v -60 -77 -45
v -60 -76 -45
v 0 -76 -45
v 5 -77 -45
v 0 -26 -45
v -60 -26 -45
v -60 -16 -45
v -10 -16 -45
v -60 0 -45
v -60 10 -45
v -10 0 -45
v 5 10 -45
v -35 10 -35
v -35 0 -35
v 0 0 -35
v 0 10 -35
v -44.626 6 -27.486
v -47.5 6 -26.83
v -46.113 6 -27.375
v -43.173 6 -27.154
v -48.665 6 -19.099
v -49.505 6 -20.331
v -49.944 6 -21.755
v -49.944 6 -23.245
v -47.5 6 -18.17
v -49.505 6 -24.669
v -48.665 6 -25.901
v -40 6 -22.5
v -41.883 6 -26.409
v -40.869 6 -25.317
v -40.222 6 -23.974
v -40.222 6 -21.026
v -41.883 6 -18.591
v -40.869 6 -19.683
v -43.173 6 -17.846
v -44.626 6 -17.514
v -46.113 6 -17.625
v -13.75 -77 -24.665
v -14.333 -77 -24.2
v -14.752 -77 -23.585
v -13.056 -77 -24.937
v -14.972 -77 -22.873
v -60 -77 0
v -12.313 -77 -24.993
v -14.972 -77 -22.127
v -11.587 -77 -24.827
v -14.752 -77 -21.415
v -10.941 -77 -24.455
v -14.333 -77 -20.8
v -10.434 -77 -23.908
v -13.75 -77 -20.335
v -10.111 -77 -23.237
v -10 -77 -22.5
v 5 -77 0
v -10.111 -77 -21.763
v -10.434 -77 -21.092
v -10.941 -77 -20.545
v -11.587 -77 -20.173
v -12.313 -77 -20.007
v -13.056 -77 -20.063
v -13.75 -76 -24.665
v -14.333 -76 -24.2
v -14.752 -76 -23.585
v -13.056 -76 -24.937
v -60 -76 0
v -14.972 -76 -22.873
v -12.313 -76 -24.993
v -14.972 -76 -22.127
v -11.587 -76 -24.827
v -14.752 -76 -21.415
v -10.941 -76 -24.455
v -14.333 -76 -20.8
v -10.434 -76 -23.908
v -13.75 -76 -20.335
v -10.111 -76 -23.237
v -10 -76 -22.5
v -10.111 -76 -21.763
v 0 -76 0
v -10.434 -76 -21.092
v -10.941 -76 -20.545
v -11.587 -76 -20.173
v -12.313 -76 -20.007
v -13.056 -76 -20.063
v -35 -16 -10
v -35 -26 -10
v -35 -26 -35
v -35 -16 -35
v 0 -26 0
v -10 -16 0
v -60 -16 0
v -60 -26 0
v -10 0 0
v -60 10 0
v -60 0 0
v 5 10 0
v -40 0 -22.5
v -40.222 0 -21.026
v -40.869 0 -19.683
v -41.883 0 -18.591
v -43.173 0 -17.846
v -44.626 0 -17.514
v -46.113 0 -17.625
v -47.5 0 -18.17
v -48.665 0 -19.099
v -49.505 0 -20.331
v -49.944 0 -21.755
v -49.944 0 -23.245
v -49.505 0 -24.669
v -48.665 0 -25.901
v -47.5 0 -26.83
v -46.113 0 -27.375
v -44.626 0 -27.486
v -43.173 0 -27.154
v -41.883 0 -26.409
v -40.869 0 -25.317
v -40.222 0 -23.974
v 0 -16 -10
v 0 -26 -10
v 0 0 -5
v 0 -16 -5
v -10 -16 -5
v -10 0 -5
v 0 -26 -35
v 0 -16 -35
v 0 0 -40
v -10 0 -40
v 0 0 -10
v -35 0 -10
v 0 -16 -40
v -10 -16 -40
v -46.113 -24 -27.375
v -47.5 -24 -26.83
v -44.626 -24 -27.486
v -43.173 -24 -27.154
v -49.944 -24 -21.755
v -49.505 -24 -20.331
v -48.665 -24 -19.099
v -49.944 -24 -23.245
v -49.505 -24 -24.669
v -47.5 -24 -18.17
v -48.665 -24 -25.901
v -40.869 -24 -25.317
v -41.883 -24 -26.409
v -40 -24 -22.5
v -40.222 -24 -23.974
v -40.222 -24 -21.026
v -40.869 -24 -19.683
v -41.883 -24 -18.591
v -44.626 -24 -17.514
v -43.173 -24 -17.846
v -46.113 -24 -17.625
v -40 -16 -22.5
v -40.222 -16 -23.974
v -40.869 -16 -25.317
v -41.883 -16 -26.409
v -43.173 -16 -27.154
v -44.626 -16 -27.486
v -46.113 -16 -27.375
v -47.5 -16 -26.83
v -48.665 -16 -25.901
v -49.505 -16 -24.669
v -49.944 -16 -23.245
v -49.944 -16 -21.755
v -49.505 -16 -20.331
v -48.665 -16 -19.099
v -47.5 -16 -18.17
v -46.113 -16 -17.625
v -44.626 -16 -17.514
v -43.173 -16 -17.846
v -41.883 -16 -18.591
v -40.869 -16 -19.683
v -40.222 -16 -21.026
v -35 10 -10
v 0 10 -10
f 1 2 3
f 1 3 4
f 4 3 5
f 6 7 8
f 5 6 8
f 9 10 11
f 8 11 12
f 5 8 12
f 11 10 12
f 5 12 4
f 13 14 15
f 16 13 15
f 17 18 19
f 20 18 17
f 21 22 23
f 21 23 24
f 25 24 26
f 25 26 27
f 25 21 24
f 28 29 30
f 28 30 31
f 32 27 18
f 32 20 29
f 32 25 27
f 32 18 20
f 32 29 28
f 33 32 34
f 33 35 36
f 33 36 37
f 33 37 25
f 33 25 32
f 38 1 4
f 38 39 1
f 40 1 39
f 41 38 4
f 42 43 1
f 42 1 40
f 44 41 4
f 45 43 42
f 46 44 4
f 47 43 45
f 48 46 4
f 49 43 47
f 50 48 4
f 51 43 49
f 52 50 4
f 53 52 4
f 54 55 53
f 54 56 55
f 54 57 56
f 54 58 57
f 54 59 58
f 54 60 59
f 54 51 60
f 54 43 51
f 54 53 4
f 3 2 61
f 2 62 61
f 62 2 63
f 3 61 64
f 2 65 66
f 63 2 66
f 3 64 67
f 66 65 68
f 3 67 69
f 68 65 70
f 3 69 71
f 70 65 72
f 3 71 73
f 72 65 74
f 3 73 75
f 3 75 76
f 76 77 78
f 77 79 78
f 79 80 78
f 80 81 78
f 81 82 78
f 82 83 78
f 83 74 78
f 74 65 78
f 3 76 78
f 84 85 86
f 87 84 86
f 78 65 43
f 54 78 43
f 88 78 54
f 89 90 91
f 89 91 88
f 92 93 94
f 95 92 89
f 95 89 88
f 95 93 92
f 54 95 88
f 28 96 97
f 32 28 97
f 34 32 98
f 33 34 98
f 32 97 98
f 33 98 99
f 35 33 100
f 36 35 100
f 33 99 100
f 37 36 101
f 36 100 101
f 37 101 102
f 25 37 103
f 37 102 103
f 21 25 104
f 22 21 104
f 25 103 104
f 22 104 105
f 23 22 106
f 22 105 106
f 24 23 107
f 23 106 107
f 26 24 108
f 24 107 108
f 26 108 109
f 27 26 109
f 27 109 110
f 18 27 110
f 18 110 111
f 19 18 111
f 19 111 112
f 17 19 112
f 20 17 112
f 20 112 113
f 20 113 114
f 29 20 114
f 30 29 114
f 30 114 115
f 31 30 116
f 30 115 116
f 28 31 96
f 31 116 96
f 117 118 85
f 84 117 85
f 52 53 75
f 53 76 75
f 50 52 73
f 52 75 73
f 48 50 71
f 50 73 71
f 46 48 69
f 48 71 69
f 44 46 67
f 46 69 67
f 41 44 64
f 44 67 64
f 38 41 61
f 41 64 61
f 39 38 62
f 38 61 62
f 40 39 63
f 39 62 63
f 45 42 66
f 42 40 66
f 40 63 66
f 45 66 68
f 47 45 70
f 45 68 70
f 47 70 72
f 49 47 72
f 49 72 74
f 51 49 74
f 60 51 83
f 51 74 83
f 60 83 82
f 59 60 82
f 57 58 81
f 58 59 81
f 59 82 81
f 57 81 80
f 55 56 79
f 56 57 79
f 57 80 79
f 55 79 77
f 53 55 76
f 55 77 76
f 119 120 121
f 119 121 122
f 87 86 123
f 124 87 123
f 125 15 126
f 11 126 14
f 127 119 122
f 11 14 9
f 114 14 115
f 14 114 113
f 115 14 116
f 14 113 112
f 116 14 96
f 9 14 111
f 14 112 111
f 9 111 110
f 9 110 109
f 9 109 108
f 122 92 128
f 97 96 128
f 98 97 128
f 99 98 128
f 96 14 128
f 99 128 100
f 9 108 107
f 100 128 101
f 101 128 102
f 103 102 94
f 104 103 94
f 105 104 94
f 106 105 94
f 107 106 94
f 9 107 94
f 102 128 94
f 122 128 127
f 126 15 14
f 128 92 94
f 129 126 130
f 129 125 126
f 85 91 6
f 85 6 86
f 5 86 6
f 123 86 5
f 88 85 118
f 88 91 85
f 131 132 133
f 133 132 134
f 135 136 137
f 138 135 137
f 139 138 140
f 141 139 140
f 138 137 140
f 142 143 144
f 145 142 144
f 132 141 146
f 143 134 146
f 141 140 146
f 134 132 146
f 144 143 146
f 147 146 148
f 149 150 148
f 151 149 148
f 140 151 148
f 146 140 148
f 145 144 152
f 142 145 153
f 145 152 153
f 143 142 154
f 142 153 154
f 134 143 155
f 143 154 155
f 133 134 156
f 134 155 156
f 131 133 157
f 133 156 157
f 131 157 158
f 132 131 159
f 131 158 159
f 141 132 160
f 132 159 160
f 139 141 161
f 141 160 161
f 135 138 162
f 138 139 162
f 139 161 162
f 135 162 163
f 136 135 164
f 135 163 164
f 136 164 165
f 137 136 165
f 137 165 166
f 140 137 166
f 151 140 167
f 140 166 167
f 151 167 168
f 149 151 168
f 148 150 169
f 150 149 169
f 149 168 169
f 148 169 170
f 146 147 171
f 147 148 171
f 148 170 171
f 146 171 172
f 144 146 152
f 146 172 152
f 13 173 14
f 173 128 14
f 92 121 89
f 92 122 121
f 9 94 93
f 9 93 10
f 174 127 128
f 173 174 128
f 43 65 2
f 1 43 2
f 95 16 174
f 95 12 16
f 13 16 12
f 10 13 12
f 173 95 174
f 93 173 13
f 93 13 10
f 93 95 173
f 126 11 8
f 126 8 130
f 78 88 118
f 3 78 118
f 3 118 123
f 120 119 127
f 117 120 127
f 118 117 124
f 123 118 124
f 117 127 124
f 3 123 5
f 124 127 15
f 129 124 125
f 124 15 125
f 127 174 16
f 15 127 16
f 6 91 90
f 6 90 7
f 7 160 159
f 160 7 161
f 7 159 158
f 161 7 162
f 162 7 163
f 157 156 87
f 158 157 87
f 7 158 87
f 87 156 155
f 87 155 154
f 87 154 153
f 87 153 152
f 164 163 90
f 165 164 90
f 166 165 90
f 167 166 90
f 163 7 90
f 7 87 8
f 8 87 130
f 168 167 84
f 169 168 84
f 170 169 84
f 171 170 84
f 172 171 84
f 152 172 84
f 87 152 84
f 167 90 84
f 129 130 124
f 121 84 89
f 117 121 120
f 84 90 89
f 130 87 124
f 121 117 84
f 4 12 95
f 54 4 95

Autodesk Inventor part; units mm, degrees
ref_plane "YZ Plane" through (0, 0, 0) normal (1, 0, 0) x (0, 1, 0)
ref_plane "XZ Plane" through (0, 0, 0) normal (0, 1, 0) x (-1, 0, 0)
ref_plane "XY Plane" through (0, 0, 0) normal (0, 0, 1) x (1, 0, 0)
sketch "Эскиз1" plane through (0, 0, 0) normal (0, 1, 0) x (-1, 0, 0)
  line L0 (0, 0) -> (60, 0)
  line L1 (60, 0) -> (60, -45)
  line L2 (60, -45) -> (0, -45)
  line L3 (0, -45) -> (0, 0)
  line L4 (0, -22.5) -> (0, 0)
  line L5 (0, 0) -> (0, -10)
  line L6 (0, -10) -> (35, -10)
  line L7 (35, -10) -> (35, -35)
  line L8 (35, -35) -> (0, -35)
  line L9 (35, -22.5) -> (45, -22.5)
  dimension "d0" = 60
  dimension "d1" = 45
  dimension "d3" = 10
  dimension "d4" = 35
  dimension "d5" = 25
  dimension "d6" = 10
extrude "Выдавливание1" add sketch "Эскиз1" along normal blind 10 contours L0 L1 L2 L3 L8 L7 L6
sketch "Эскиз3" plane through (0, 0, -35) normal (1, 0, 0) x (0, 0, -1)
  line L0 (10, 10) -> (-35, 10) projected
  line L1 (10, 10) -> (-35, 10)
  line L2 (-35, 10) -> (-35, -26)
  line L3 (-35, -26) -> (10, -26)
  line L4 (10, -26) -> (10, 10)
  point P0 (-35, 0)
  dimension "d13" = 45
  dimension "d14" = 36
extrude "Выдавливание3" add sketch "Эскиз3" along normal blind 5
sketch "Эскиз4" plane through (0, -26, -45) normal (0, -1, 0) x (1, 0, 0)
  line L0 (-60, 0) -> (0, 0)
  line L1 (0, 0) -> (0, 45)
  line L2 (0, 45) -> (-60, 45)
  line L3 (-60, 45) -> (-60, 0)
  line L4 (0, 35) -> (-35, 35) projected
  line L5 (-35, 10) -> (0, 10)
  line L6 (0, 10) -> (0, 35)
  line L7 (0, 35) -> (-35, 35)
  line L8 (-35, 35) -> (-35, 10)
extrude "Выдавливание4" add sketch "Эскиз4" against normal blind 10 contours L3 L2 L1 L4 L8 L5 L0
sketch "Эскиз5" plane through (0, 0, 0) normal (0, -1, 0) x (1, 0, 0)
  line L0 (-35, -10) -> (-35, -35) projected
  line L1 (-35, -22.5) -> (-45, -22.5)
  circle A0 centre (-45, -22.5) radius 5
  point P0 (0, 0)
  dimension "d19" = 10
  dimension "d20" = 10
extrude "Выдавливание5" cut sketch "Эскиз5" along normal blind 24 and the other way blind 6
sketch "Эскиз6" plane through (5, -26, -45) normal (0, -1, 0) x (1, 0, 0)
  line L0 (0, 0) -> (0, 45) projected
  line L1 (-65, 0) -> (0, 0) projected
  line L2 (0, 45) -> (-5, 45)
  line L3 (-5, 45) -> (-5, 0)
  line L4 (-5, 0) -> (0, 0)
  line L5 (0, 0) -> (0, 45)
extrude "Выдавливание6" add sketch "Эскиз6" along normal blind 50
sketch "Эскиз7" plane through (5, -76, -45) normal (0, -1, 0) x (1, 0, 0)
  line L0 (-65, 45) -> (0, 45) projected
  line L1 (0, 45) -> (-65, 45)
  line L2 (-65, 45) -> (-65, 0)
  line L3 (-65, 0) -> (0, 0)
  line L4 (0, 0) -> (0, 45)
  line L5 (-5, 10) -> (-5, 35) projected
  line L6 (-5, 22.5) -> (-15, 22.5)
  line L7 (-15, 22.5) -> (-17.5, 22.5)
  circle A0 centre (-17.5, 22.5) radius 2.5
  point P0 (-5, 45)
  dimension "d27" = 10
  dimension "d28" = 2.5
extrude "Выдавливание7" add sketch "Эскиз7" along normal blind 1
sketch "Эскиз8" plane through (0, 0, -35) normal (-1, 0, 0) x (0, 0, 1)
  line L0 (0, 0) -> (-10, 0) projected
  line L1 (-10, -16) -> (35, -16) projected
  line L2 (-10, 0) -> (-5, 0)
  line L3 (-5, 0) -> (-5, -16)
  line L4 (-5, -16) -> (-10, -16)
  line L5 (-10, -16) -> (-10, 0)
  line L6 (-10, 0) -> (35, 0) projected
  line L7 (35, -16) -> (30, -16)
  line L8 (30, -16) -> (30, 0)
  line L9 (30, 0) -> (35, 0)
  line L10 (35, 0) -> (35, -16)
  point P0 (25, -16)
  point P1 (-5, 0)
  dimension "d31" = 5
  dimension "d34" = 5
extrude "Выдавливание8" add sketch "Эскиз8" along normal blind 10 contours L3 L1 L5 L0 | L6 L10 L1 L8
properties part number "Стенка"
